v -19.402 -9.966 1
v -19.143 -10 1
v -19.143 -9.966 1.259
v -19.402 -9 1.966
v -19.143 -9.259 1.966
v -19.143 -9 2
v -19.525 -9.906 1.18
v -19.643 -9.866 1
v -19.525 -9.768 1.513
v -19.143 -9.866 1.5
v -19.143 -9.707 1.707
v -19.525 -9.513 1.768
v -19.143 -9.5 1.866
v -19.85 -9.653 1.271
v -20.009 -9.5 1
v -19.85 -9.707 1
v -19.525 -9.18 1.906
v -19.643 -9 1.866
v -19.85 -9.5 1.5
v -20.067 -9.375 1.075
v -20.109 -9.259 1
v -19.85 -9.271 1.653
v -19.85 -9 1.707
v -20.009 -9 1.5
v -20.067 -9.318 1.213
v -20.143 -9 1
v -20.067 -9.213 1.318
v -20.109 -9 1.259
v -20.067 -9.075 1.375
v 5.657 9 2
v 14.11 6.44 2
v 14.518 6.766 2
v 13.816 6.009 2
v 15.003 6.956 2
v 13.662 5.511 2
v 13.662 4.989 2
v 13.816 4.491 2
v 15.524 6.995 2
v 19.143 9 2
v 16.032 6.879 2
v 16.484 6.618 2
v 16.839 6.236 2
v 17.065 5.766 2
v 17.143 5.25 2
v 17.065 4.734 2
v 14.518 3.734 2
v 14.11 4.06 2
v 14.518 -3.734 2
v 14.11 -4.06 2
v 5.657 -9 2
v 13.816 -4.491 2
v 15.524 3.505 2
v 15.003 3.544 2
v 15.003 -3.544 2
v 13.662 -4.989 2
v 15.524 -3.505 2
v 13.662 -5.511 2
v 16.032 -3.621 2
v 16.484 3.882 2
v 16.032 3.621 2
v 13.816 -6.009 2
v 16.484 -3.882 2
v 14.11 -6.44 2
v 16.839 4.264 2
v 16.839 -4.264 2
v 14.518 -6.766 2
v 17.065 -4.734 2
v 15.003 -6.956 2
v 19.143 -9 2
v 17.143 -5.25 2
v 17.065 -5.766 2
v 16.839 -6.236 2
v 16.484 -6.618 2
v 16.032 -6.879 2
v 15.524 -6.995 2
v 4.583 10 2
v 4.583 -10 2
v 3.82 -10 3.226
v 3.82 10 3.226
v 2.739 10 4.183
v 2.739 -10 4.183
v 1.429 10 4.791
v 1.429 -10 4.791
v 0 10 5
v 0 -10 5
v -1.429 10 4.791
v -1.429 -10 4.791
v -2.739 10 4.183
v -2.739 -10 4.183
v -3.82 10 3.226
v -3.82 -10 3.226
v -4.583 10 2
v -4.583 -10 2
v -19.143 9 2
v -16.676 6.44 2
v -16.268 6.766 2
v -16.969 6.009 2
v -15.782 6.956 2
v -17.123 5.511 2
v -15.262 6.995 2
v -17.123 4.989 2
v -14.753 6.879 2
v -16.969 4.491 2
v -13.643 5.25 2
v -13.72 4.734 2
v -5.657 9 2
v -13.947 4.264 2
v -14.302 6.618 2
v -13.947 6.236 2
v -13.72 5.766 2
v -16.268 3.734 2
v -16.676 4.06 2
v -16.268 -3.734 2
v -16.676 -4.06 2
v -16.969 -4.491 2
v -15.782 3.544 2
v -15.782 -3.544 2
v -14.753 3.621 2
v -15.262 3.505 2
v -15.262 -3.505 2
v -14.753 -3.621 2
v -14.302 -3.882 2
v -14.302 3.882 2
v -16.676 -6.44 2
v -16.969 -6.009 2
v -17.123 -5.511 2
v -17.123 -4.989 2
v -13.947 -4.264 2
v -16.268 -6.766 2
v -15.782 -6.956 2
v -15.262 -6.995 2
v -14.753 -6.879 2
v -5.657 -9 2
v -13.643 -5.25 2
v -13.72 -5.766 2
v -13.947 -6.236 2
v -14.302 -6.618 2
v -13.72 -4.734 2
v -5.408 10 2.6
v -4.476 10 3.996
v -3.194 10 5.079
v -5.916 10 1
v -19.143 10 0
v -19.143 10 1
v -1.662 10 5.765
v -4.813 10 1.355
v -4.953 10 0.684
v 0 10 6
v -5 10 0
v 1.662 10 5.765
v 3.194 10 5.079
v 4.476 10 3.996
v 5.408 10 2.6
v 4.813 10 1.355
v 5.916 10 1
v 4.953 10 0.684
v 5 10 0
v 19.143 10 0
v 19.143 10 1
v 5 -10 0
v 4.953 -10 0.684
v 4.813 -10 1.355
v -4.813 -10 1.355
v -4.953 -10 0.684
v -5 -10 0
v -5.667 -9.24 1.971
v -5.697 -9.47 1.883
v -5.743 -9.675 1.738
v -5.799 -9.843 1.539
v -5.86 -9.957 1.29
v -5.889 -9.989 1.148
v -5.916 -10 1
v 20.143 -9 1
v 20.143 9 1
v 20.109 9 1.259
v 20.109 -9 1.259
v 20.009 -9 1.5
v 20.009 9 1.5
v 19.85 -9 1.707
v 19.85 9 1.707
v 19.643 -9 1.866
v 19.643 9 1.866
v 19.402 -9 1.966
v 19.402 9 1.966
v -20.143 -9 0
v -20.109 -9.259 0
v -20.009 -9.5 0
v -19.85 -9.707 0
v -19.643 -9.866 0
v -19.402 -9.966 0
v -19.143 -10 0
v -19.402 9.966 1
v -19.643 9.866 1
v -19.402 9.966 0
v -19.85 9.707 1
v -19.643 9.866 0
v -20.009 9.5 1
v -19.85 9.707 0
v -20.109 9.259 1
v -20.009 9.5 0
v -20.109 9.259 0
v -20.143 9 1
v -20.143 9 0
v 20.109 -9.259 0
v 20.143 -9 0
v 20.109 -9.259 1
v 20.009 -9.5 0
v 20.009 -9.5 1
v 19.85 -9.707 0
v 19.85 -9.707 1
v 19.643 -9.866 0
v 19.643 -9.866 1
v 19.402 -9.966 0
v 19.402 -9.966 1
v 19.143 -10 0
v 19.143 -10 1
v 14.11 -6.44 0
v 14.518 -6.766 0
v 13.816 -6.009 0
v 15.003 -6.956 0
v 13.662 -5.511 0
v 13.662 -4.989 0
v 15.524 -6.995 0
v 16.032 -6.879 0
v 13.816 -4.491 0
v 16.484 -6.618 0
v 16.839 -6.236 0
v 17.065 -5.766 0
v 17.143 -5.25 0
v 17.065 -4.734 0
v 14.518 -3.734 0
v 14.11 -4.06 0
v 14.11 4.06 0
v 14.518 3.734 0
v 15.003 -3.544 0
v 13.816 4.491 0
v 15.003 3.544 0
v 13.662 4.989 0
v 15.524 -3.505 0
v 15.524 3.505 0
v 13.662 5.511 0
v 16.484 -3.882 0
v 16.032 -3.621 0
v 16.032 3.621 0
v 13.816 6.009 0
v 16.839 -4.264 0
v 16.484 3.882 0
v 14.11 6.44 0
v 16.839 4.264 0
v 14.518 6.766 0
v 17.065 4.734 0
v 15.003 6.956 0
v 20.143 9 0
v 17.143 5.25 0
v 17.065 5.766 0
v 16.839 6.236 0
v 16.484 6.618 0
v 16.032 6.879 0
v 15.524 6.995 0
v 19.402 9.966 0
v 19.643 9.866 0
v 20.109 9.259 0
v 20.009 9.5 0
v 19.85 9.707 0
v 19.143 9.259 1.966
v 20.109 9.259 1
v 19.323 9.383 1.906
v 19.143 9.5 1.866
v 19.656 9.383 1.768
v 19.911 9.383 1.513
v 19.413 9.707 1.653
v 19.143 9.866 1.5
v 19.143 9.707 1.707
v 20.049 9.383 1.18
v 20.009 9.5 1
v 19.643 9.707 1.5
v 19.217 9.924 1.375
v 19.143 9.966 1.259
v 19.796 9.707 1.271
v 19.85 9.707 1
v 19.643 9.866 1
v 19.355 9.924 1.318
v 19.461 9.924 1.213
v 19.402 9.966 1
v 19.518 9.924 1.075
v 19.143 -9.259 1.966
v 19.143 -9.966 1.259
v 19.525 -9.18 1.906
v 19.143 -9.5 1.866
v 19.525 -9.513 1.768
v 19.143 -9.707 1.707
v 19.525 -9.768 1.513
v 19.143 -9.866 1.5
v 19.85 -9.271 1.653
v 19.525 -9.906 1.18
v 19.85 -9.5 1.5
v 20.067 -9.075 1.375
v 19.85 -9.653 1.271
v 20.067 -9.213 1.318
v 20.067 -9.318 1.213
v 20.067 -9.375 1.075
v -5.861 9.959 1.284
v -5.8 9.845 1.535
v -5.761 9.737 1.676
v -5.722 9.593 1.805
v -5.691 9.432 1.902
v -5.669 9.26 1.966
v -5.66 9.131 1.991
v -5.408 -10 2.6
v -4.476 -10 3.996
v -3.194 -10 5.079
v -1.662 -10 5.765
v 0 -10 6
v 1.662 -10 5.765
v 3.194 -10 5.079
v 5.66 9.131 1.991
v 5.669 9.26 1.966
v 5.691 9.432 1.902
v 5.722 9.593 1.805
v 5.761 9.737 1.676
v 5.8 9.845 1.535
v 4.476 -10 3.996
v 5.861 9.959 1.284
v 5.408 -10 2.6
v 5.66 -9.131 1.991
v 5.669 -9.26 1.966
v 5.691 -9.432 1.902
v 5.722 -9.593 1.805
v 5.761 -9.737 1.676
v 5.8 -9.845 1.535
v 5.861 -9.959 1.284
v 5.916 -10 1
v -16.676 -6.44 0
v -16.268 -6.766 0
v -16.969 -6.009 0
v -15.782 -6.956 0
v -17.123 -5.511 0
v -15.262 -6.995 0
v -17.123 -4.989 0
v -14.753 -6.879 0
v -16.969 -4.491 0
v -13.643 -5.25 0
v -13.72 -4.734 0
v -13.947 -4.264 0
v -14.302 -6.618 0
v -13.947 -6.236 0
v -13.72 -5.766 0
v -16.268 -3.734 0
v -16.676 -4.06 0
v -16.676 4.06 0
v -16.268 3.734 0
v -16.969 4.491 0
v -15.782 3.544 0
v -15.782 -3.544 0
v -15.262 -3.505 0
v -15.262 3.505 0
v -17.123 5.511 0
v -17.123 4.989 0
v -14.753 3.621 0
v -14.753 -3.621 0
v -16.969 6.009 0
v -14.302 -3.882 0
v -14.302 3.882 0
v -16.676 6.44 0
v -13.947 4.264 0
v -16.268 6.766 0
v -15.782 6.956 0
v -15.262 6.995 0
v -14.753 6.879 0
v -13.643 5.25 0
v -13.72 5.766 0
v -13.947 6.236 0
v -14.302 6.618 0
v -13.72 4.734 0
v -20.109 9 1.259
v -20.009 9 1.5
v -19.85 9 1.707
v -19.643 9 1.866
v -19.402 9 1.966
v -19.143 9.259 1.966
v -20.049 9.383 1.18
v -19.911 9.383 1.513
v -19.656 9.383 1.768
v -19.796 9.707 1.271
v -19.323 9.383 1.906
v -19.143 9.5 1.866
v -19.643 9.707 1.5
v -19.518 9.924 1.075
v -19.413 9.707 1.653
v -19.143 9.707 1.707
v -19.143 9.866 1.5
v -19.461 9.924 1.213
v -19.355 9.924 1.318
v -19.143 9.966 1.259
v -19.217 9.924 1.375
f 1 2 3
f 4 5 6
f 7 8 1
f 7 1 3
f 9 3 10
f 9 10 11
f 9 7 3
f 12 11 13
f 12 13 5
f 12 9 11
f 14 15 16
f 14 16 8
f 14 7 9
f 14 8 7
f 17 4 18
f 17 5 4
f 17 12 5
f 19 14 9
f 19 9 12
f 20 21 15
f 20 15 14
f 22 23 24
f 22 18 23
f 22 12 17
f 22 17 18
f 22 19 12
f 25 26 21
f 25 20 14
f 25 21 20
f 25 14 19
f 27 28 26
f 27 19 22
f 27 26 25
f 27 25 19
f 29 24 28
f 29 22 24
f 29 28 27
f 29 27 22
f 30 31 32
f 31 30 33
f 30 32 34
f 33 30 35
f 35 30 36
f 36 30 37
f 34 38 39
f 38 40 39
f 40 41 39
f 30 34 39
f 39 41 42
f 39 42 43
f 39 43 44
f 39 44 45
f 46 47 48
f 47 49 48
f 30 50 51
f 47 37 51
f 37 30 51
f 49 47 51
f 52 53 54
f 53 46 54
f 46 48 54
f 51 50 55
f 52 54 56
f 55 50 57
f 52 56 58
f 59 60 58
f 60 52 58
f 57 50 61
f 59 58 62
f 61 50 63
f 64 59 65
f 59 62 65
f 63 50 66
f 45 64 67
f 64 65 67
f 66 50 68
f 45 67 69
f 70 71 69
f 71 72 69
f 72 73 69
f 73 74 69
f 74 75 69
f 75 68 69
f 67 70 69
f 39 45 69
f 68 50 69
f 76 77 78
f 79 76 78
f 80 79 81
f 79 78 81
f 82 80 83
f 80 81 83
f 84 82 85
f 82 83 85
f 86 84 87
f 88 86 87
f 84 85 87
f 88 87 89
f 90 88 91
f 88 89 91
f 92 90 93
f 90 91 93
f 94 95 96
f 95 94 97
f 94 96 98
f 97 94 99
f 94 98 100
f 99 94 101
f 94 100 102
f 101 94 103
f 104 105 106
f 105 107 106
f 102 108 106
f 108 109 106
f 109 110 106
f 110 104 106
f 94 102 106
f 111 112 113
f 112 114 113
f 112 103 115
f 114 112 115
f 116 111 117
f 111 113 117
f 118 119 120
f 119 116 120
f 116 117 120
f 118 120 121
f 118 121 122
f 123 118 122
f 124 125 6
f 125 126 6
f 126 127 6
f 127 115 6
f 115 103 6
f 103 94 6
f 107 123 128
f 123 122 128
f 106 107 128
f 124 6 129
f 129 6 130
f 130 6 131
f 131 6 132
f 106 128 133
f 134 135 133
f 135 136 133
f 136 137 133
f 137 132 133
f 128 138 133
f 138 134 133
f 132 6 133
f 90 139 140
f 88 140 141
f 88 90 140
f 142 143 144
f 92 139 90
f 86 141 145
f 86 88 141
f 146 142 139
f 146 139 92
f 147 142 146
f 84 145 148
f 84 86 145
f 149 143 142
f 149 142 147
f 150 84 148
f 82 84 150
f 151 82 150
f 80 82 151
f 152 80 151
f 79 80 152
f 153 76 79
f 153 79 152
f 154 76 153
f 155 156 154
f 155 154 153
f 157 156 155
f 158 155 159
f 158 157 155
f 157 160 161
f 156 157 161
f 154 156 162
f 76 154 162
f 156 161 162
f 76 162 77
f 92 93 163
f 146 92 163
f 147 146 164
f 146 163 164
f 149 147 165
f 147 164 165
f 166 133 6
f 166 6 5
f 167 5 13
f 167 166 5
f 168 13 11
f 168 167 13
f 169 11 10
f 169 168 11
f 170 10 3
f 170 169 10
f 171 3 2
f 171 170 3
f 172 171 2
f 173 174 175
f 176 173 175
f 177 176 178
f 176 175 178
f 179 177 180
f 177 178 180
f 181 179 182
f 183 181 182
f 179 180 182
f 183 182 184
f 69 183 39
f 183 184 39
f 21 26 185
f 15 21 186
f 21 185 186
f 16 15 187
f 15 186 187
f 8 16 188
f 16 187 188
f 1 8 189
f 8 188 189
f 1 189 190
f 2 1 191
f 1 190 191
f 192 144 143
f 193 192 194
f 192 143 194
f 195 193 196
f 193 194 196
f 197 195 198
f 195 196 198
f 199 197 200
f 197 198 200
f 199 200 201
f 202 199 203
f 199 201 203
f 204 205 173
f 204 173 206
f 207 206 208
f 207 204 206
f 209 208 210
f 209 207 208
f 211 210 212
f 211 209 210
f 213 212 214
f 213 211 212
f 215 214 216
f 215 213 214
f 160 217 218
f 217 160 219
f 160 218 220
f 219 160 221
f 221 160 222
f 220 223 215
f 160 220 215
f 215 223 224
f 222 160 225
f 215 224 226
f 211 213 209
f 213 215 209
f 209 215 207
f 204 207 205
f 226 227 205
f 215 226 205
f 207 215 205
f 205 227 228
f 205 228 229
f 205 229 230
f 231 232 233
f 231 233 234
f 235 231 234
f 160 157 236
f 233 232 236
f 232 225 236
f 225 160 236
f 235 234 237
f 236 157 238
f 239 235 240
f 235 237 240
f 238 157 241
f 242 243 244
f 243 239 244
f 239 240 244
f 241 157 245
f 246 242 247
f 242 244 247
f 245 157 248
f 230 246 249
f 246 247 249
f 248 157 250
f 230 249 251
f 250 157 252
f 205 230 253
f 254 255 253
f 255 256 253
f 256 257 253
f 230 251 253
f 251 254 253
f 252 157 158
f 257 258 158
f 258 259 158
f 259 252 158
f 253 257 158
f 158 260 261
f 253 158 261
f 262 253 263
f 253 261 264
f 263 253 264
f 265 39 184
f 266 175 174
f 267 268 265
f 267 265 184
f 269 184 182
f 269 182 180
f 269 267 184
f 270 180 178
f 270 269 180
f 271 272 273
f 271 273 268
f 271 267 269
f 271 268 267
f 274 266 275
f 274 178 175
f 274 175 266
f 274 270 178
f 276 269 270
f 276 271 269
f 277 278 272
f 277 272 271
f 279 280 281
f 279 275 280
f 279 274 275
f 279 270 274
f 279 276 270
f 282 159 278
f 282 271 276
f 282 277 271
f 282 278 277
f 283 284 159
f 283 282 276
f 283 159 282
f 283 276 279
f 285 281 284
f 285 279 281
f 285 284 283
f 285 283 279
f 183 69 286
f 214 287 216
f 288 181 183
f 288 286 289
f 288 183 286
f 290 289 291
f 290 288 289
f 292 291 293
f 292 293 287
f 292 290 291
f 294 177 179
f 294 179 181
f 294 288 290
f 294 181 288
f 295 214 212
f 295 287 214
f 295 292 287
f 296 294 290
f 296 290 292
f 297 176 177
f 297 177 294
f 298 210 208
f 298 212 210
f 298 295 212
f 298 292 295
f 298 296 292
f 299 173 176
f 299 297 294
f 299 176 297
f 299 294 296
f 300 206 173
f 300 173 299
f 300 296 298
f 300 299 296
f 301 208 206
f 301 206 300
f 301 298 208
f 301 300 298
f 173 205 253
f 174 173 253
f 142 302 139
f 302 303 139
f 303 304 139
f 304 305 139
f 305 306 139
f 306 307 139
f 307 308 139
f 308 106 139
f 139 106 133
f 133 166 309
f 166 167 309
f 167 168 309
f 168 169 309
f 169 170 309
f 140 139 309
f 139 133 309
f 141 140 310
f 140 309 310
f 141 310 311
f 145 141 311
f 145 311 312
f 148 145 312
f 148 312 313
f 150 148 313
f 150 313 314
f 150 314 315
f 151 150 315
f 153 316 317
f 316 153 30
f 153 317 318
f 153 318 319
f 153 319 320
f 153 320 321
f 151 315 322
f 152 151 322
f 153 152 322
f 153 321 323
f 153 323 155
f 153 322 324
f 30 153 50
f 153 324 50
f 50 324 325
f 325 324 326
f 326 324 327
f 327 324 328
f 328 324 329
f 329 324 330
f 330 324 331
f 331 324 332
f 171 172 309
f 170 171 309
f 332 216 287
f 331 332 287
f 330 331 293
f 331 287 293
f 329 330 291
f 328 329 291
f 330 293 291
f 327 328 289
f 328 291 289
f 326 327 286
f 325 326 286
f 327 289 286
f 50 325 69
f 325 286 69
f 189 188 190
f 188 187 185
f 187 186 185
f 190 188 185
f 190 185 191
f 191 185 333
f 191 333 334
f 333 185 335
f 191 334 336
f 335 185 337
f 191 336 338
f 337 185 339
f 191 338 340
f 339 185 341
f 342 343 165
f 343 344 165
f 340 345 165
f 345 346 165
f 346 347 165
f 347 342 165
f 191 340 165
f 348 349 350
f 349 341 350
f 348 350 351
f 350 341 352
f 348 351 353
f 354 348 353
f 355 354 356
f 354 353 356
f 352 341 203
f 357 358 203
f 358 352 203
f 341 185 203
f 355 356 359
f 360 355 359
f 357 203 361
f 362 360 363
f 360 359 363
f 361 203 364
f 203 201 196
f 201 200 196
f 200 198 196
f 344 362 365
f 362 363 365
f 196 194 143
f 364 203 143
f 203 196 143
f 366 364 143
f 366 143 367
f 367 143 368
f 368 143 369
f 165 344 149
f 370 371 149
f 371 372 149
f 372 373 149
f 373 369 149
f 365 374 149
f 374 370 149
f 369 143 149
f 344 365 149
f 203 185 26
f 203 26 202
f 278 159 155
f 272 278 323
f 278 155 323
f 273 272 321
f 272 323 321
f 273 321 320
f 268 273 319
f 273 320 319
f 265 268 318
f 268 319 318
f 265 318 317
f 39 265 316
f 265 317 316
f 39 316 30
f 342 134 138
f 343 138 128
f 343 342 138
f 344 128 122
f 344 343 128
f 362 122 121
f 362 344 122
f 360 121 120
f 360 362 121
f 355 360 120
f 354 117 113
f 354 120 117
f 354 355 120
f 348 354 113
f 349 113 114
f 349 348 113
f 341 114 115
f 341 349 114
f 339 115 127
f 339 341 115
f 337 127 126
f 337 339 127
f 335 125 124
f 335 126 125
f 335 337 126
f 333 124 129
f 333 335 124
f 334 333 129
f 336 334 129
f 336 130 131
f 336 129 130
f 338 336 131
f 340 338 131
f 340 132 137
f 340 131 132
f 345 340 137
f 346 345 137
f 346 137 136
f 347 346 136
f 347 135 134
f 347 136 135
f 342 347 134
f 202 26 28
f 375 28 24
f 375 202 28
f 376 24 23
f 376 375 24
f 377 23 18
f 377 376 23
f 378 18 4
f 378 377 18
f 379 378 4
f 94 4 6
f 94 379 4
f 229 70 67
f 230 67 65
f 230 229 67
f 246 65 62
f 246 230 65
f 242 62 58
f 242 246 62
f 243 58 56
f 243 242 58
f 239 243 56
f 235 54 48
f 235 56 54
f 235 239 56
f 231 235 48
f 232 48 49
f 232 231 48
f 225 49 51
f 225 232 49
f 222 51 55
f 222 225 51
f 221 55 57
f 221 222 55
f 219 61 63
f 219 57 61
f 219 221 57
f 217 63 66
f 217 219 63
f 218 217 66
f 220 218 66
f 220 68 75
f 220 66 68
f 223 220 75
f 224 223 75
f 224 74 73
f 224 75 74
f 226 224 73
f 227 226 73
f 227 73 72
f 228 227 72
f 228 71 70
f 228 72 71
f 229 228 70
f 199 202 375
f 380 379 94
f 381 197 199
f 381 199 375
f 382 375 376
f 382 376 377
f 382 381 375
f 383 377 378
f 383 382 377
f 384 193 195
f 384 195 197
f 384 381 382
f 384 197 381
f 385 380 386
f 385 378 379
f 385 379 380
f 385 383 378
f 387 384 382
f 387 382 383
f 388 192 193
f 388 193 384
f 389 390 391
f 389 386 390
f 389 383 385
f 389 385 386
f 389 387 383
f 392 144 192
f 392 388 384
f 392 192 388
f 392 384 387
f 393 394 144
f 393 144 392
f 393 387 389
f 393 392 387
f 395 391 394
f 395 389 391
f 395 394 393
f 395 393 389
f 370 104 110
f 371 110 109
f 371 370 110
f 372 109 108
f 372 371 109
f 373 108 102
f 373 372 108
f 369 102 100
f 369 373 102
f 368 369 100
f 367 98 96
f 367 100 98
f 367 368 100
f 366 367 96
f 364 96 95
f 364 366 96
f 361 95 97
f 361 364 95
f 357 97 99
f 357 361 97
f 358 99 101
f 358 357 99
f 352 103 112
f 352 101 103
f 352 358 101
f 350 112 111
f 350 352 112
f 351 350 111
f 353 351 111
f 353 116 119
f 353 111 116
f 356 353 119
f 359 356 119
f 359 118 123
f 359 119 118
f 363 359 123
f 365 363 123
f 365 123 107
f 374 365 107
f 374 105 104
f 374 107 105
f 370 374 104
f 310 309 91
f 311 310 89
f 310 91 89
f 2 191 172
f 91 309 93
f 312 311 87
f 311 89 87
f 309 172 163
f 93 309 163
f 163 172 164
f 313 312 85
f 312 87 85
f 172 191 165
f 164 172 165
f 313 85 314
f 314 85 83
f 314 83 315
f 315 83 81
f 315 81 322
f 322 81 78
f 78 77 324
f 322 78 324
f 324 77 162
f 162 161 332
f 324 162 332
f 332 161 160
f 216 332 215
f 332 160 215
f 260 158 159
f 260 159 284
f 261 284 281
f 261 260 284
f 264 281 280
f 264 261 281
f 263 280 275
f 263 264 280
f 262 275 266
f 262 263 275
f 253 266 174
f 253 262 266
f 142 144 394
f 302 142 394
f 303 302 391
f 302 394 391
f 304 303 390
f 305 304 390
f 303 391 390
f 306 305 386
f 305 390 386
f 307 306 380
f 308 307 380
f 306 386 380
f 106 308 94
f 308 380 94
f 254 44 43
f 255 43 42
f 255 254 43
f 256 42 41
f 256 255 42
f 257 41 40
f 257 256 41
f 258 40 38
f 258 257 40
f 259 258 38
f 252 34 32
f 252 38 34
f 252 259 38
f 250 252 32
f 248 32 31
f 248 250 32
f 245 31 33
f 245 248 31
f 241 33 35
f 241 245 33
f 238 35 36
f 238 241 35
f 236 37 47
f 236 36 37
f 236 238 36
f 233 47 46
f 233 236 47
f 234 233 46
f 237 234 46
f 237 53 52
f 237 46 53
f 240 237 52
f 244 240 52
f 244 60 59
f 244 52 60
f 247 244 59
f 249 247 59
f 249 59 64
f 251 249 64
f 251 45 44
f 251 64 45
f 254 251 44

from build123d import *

# Parameters (mm, degrees)
F0_W         = 40.28548
F0_H         = 20
F0_R         = 1.75
F1_DEPTH     = 10
F3_DEPTH     = 25
F4_R         = 1
F5_T1_DEPTH  = 3.5
F5_S5_W      = 1
F5_S5_H      = 1
F5_T6_DEPTH  = 1
F5_S11_W     = 1
F5_S11_H     = 1
F5_T12_DEPTH = 1
F5_S17_W     = 1
F5_S17_H     = 1
F5_T18_DEPTH = 1
F5_S23_W     = 1
F5_S23_H     = 1
F5_T24_DEPTH = 1


# Not quite as in the source:
# - a fillet or chamfer that OpenCascade refuses, or shapes differently, is made with other operations: its cross-section is extruded or revolved along the edge and cut away or added


with BuildPart() as f1:
    # F0 (on Top) → F1 (new body)
    with BuildSketch(Plane.XY):
        Rectangle(F0_W, F0_H)
        with Locations((-15.39274, -5.25)):
            Circle(F0_R, mode=Mode.SUBTRACT)
        with Locations((15.39274, -5.25)):
            Circle(F0_R, mode=Mode.SUBTRACT)
        with Locations((-15.39274, 5.25)):
            Circle(F0_R, mode=Mode.SUBTRACT)
        with Locations((15.39274, 5.25)):
            Circle(F0_R, mode=Mode.SUBTRACT)
    extrude(amount=F1_DEPTH)

    # F2 (on face) → F3 (cut)
    with BuildSketch(Plane.XZ.offset(10)):
        with BuildLine():
            Line((-4.582575695, 2), (4.582575695, 2))
            ThreePointArc((4.582575695, 2), (0, 5), (-4.582575695, 2))
        make_face()
        with BuildLine():
            Line((-5, 0), (5, 0))
            ThreePointArc((5, 0), (4.8945315647, 1.0215482184), (4.582575695, 2))
            Line((4.582575695, 2), (-4.582575695, 2))
            ThreePointArc((-4.582575695, 2), (-4.8945315647, 1.0215482184), (-5, 0))
        make_face()
        with BuildLine():
            ThreePointArc((-5.6568542495, 2), (0, 6), (5.6568542495, 2))
            Line((5.6568542495, 2), (20.14274, 2))
            Line((20.14274, 2), (20.14274, 10))
            Line((20.14274, 10), (-20.14274, 10))
            Line((-20.14274, 10), (-20.14274, 2))
            Line((-20.14274, 2), (-5.6568542495, 2))
        make_face()
    extrude(amount=-F3_DEPTH, mode=Mode.SUBTRACT)

    # F4
    f4_edges = [f1.edges().sort_by_distance(p)[0] for p in [
        (-20.14274, 0, 2),
        (-12.899797, -10, 2),
        (-12.899797, 10, 2),
        (12.899797, 10, 2),
        (20.14274, 0, 2),
        (12.899797, -10, 2),
    ]]
    fillet(f4_edges, radius=F4_R)

    # F5: fillet of radius 1 on 4 edges, made by hand

    # F5_s2 → F5_t1 (cut)
    with BuildSketch(Plane.XY.offset(-2.5)):
        with BuildLine():
            ThreePointArc((20.14274, -9), (19.8498467812, -9.7071067812), (19.14274, -10))
            Line((19.14274, -10), (20.14274, -10))
            Line((20.14274, -10), (20.14274, -9))
        make_face()
        with BuildLine():
            ThreePointArc((19.14274, 10), (19.8498467812, 9.7071067812), (20.14274, 9))
            Line((20.14274, 9), (20.14274, 10))
            Line((20.14274, 10), (19.14274, 10))
        make_face()
        with BuildLine():
            ThreePointArc((-19.14274, 10), (-19.8498467812, 9.7071067812), (-20.14274, 9))
            Line((-20.14274, 9), (-20.14274, 10))
            Line((-20.14274, 10), (-19.14274, 10))
        make_face()
        with BuildLine():
            ThreePointArc((-20.14274, -9), (-19.8498467812, -9.7071067812), (-19.14274, -10))
            Line((-19.14274, -10), (-20.14274, -10))
            Line((-20.14274, -10), (-20.14274, -9))
        make_face()
    extrude(amount=F5_T1_DEPTH, mode=Mode.SUBTRACT)


with BuildPart() as f5_tool4:
    # F5_s5 → F5_t6 (new body)
    with BuildSketch(Plane.YZ.offset(-19.14274)):
        with Locations((-9.5, 1.5)):
            Rectangle(F5_S5_W, F5_S5_H)
    extrude(amount=-F5_T6_DEPTH)

    # F5_s7 → F5_t8 (revolve, cut)
    with BuildSketch(Plane(origin=(-19.14274, -9, 1), x_dir=(0, 0.7071067812, -0.7071067812), z_dir=(0, 0.7071067812, 0.7071067812))):
        with BuildLine():
            ThreePointArc((0, -1), (1, 0), (0, 1))
            Line((0, 1), (0, -1))
        make_face()
    revolve(axis=Axis((-19.14274, -9, 1), (-1, 0, 0)), mode=Mode.SUBTRACT)


with BuildPart() as f1_1:
    add(f1.part)

    # F5_t3: cut F5_tool4
    add(f5_tool4.part, mode=Mode.SUBTRACT)


with BuildPart() as f5_tool10:
    # F5_s11 → F5_t12 (new body)
    with BuildSketch(Plane.XZ.offset(-9)):
        with Locations((-19.64274, 1.5)):
            Rectangle(F5_S11_W, F5_S11_H)
    extrude(amount=-F5_T12_DEPTH)

    # F5_s13 → F5_t14 (revolve, cut)
    with BuildSketch(Plane(origin=(-19.14274, 9, 1), x_dir=(0.7071067812, 0, -0.7071067812), z_dir=(0.7071067812, 0, 0.7071067812))):
        with BuildLine():
            ThreePointArc((0, -1), (1, 0), (0, 1))
            Line((0, 1), (0, -1))
        make_face()
    revolve(axis=Axis((-19.14274, 9, 1), (0, 1, 0)), mode=Mode.SUBTRACT)


with BuildPart() as f1_2:
    add(f1_1.part)

    # F5_t9: cut F5_tool10
    add(f5_tool10.part, mode=Mode.SUBTRACT)


with BuildPart() as f5_tool16:
    # F5_s17 → F5_t18 (new body)
    with BuildSketch(Plane.XZ.offset(-9)):
        with Locations((19.64274, 1.5)):
            Rectangle(F5_S17_W, F5_S17_H)
    extrude(amount=-F5_T18_DEPTH)

    # F5_s19 → F5_t20 (revolve, cut)
    with BuildSketch(Plane(origin=(19.14274, 9, 1), x_dir=(-0.7071067812, 0, -0.7071067812), z_dir=(0.7071067812, 0, -0.7071067812))):
        with BuildLine():
            ThreePointArc((0, -1), (1, 0), (0, 1))
            Line((0, 1), (0, -1))
        make_face()
    revolve(axis=Axis((19.14274, 9, 1), (0, 1, 0)), mode=Mode.SUBTRACT)


with BuildPart() as f1_3:
    add(f1_2.part)

    # F5_t15: cut F5_tool16
    add(f5_tool16.part, mode=Mode.SUBTRACT)


with BuildPart() as f5_tool22:
    # F5_s23 → F5_t24 (new body)
    with BuildSketch(Plane.YZ.offset(19.14274)):
        with Locations((-9.5, 1.5)):
            Rectangle(F5_S23_W, F5_S23_H)
    extrude(amount=F5_T24_DEPTH)

    # F5_s25 → F5_t26 (revolve, cut)
    with BuildSketch(Plane(origin=(19.14274, -9, 1), x_dir=(0, 0.7071067812, -0.7071067812), z_dir=(0, -0.7071067812, -0.7071067812))):
        with BuildLine():
            ThreePointArc((0, -1), (1, 0), (0, 1))
            Line((0, 1), (0, -1))
        make_face()
    revolve(axis=Axis((19.14274, -9, 1), (1, 0, 0)), mode=Mode.SUBTRACT)


with BuildPart() as f1_4:
    add(f1_3.part)

    # F5_t21: cut F5_tool22
    add(f5_tool22.part, mode=Mode.SUBTRACT)


solid = f1_4.part
